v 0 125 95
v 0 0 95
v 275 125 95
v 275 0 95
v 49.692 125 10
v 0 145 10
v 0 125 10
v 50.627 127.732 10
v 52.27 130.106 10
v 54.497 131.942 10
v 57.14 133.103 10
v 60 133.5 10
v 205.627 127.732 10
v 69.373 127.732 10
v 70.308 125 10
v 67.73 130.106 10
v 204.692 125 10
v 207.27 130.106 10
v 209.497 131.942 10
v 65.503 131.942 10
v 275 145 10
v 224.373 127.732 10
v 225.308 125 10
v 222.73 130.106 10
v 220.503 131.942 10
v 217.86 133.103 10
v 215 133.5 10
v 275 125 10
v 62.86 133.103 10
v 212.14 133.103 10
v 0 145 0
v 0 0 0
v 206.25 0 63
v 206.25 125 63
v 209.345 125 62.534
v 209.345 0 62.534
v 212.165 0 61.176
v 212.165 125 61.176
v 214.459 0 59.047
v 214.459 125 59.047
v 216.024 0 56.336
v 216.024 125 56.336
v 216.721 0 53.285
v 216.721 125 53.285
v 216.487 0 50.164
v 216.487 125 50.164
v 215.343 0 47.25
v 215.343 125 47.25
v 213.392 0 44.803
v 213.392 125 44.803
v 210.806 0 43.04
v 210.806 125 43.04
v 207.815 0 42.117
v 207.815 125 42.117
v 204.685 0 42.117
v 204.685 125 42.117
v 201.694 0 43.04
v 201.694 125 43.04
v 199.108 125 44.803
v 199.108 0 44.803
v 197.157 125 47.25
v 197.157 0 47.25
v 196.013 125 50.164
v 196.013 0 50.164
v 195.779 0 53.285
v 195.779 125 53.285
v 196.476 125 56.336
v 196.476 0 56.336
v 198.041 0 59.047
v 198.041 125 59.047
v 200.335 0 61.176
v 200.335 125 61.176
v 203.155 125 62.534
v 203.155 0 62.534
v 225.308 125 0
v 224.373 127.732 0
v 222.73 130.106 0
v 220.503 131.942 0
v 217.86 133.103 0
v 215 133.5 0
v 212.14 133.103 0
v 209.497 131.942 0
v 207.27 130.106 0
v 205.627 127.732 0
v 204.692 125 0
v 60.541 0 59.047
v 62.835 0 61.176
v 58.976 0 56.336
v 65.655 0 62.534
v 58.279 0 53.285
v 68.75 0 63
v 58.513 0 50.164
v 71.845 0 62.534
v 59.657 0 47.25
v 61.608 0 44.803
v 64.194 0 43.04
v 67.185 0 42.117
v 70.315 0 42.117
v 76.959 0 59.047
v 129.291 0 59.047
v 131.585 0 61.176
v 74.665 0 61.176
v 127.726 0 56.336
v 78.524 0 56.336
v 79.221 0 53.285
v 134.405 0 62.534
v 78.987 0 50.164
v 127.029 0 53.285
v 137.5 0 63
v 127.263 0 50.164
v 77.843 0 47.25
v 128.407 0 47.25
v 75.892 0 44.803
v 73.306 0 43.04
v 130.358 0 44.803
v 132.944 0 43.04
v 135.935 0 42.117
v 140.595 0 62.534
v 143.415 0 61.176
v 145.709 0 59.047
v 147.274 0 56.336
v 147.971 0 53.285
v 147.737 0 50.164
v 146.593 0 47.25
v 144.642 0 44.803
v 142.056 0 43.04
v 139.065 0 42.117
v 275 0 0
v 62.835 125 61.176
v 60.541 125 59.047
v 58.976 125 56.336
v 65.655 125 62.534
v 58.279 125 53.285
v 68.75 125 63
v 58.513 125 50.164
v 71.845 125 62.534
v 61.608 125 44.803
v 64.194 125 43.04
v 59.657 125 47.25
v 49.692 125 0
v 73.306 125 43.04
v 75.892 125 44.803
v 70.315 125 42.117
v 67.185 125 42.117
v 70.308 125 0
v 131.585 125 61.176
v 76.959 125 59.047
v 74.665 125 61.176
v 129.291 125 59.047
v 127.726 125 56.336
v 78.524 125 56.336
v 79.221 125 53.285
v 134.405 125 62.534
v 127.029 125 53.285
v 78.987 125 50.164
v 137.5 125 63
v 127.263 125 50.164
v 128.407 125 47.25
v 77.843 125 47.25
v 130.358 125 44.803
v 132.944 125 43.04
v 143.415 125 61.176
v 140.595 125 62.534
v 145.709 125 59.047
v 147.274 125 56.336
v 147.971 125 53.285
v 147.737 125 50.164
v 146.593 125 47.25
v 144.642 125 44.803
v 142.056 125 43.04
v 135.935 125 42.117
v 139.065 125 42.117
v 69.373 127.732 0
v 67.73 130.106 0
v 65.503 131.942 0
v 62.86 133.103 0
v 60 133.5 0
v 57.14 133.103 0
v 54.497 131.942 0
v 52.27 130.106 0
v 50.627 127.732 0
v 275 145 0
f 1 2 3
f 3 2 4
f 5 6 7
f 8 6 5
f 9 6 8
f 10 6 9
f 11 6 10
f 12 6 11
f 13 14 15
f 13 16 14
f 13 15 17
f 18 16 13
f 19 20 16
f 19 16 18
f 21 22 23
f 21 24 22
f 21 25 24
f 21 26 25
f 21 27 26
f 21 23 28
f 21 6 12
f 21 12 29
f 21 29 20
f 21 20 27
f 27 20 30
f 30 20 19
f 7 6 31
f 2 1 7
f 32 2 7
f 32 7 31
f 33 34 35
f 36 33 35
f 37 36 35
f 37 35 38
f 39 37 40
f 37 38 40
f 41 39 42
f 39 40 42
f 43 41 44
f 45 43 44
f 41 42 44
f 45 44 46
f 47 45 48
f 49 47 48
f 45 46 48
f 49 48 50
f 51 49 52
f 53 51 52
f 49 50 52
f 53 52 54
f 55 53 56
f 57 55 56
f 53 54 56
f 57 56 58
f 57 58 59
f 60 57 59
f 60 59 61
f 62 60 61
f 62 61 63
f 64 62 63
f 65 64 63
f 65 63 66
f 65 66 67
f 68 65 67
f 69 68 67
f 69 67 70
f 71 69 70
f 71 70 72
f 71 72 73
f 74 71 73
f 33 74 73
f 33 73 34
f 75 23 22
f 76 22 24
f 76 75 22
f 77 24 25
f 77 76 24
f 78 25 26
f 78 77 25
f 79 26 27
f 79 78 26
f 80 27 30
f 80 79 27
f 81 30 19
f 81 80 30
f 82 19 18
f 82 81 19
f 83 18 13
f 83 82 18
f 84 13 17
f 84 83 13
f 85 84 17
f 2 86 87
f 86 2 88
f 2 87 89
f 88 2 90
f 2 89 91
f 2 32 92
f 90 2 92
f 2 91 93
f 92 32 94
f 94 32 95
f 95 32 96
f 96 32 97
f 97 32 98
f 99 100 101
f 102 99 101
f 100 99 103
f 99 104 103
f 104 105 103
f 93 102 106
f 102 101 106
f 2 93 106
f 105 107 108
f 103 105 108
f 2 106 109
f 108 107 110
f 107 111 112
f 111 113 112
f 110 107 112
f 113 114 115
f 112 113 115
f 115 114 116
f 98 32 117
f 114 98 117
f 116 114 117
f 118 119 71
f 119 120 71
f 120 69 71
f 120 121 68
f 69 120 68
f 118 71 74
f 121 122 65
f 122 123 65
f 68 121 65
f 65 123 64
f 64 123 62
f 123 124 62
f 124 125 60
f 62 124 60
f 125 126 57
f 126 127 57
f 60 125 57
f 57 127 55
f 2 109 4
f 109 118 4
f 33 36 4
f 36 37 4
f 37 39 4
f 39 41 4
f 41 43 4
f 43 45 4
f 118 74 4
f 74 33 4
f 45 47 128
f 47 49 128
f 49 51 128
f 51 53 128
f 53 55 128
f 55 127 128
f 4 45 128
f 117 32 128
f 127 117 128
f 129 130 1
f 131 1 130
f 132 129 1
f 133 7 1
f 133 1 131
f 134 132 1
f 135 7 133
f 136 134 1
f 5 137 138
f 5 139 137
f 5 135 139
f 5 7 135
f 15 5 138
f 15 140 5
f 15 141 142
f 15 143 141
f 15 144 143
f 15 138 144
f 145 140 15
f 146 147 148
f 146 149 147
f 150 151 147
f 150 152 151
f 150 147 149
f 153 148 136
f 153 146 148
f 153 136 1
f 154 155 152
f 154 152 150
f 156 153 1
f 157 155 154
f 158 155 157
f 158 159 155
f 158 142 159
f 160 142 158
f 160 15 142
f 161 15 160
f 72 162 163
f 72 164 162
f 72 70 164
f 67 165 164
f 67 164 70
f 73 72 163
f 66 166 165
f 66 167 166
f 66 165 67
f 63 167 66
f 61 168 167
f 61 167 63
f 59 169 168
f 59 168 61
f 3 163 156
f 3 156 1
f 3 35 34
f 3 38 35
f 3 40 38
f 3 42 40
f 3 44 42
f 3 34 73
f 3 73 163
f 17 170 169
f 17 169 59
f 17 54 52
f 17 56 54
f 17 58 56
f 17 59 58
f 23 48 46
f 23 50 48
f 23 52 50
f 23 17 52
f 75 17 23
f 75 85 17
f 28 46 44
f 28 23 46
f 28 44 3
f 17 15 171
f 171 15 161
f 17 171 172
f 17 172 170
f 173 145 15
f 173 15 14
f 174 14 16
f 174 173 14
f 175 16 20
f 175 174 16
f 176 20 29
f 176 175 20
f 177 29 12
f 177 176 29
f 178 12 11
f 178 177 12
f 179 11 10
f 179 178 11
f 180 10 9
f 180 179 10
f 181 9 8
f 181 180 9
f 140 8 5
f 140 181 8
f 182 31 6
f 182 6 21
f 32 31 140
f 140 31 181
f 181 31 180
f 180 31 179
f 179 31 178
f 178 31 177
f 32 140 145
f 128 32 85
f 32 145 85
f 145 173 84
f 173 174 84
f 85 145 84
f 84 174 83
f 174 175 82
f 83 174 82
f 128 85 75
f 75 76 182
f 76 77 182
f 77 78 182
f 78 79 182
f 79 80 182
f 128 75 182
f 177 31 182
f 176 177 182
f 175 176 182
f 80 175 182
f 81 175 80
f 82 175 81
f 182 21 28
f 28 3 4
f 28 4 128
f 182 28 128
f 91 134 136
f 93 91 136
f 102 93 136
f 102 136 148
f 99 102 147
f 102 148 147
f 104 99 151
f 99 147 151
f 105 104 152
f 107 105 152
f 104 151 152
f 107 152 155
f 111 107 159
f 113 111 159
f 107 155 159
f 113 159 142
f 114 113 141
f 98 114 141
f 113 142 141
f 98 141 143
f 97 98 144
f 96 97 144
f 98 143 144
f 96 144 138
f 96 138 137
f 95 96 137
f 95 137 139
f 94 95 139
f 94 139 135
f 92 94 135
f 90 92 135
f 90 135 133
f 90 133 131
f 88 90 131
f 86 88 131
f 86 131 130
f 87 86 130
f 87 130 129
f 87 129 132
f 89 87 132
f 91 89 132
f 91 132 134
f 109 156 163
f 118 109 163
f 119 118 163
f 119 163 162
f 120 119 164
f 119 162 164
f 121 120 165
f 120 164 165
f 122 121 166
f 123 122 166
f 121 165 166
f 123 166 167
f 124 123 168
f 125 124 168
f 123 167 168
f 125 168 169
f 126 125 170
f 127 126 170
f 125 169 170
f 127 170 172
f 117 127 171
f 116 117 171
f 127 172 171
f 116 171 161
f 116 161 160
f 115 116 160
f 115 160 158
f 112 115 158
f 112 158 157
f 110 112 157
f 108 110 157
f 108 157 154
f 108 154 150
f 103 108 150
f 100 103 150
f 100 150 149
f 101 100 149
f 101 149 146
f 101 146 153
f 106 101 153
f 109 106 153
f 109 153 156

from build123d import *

# Parameters (mm, degrees)
ESQUISSE1_W             = 275
ESQUISSE1_H             = 145
ESQUISSE1_R             = 10.5
ESQUISSE1_R_2           = 8
BOSS_EXTRU_1_DEPTH      = 10
ESQUISSE2_W             = 275
ESQUISSE2_H             = 95
BOSS_EXTRU_2_DEPTH      = 125
ESQUISSE4_R             = 10.5
ENL_V_MAT_EXTRU_1_DEPTH = 317.662280671


with BuildPart() as part:
    # Esquisse1 → Boss.-Extru.1 (new body)
    with BuildSketch(Plane.XY):
        with Locations((137.5, 72.5)):
            Rectangle(ESQUISSE1_W, ESQUISSE1_H)
        with Locations((60, 123)):
            Circle(ESQUISSE1_R, mode=Mode.SUBTRACT)
        with Locations((25, 85)):
            Circle(ESQUISSE1_R_2, mode=Mode.SUBTRACT)
        with Locations(Location((250, 85, 0), (0, 0, 180))):
            Circle(ESQUISSE1_R_2, mode=Mode.SUBTRACT)
        with Locations(Location((215, 123, 0), (0, 0, 180))):
            Circle(ESQUISSE1_R, mode=Mode.SUBTRACT)
    extrude(amount=BOSS_EXTRU_1_DEPTH)

    # Esquisse2 → Boss.-Extru.2 (add)
    with BuildSketch(Plane(origin=(0, 0, 0), x_dir=(1, 0, 0), z_dir=(0, 1, 0))):
        with Locations((137.5, -47.5)):
            Rectangle(ESQUISSE2_W, ESQUISSE2_H)
    extrude(amount=BOSS_EXTRU_2_DEPTH)

    # Esquisse4 → Enlèv. mat.-Extru.1 (cut, through all)
    with BuildSketch(Plane(origin=(0, 125, 0), x_dir=(1, 0, 0), z_dir=(0, 1, 0))):
        with Locations(Location((206.25, -52.5, 0), (0, 0, 270))):
            Circle(ESQUISSE4_R)
        with Locations(Location((137.5, -52.5, 0), (0, 0, 270))):
            Circle(ESQUISSE4_R)
        with Locations(Location((68.75, -52.5, 0), (0, 0, 270))):
            Circle(ESQUISSE4_R)
    extrude(amount=-ENL_V_MAT_EXTRU_1_DEPTH, mode=Mode.SUBTRACT)


solid = part.part
